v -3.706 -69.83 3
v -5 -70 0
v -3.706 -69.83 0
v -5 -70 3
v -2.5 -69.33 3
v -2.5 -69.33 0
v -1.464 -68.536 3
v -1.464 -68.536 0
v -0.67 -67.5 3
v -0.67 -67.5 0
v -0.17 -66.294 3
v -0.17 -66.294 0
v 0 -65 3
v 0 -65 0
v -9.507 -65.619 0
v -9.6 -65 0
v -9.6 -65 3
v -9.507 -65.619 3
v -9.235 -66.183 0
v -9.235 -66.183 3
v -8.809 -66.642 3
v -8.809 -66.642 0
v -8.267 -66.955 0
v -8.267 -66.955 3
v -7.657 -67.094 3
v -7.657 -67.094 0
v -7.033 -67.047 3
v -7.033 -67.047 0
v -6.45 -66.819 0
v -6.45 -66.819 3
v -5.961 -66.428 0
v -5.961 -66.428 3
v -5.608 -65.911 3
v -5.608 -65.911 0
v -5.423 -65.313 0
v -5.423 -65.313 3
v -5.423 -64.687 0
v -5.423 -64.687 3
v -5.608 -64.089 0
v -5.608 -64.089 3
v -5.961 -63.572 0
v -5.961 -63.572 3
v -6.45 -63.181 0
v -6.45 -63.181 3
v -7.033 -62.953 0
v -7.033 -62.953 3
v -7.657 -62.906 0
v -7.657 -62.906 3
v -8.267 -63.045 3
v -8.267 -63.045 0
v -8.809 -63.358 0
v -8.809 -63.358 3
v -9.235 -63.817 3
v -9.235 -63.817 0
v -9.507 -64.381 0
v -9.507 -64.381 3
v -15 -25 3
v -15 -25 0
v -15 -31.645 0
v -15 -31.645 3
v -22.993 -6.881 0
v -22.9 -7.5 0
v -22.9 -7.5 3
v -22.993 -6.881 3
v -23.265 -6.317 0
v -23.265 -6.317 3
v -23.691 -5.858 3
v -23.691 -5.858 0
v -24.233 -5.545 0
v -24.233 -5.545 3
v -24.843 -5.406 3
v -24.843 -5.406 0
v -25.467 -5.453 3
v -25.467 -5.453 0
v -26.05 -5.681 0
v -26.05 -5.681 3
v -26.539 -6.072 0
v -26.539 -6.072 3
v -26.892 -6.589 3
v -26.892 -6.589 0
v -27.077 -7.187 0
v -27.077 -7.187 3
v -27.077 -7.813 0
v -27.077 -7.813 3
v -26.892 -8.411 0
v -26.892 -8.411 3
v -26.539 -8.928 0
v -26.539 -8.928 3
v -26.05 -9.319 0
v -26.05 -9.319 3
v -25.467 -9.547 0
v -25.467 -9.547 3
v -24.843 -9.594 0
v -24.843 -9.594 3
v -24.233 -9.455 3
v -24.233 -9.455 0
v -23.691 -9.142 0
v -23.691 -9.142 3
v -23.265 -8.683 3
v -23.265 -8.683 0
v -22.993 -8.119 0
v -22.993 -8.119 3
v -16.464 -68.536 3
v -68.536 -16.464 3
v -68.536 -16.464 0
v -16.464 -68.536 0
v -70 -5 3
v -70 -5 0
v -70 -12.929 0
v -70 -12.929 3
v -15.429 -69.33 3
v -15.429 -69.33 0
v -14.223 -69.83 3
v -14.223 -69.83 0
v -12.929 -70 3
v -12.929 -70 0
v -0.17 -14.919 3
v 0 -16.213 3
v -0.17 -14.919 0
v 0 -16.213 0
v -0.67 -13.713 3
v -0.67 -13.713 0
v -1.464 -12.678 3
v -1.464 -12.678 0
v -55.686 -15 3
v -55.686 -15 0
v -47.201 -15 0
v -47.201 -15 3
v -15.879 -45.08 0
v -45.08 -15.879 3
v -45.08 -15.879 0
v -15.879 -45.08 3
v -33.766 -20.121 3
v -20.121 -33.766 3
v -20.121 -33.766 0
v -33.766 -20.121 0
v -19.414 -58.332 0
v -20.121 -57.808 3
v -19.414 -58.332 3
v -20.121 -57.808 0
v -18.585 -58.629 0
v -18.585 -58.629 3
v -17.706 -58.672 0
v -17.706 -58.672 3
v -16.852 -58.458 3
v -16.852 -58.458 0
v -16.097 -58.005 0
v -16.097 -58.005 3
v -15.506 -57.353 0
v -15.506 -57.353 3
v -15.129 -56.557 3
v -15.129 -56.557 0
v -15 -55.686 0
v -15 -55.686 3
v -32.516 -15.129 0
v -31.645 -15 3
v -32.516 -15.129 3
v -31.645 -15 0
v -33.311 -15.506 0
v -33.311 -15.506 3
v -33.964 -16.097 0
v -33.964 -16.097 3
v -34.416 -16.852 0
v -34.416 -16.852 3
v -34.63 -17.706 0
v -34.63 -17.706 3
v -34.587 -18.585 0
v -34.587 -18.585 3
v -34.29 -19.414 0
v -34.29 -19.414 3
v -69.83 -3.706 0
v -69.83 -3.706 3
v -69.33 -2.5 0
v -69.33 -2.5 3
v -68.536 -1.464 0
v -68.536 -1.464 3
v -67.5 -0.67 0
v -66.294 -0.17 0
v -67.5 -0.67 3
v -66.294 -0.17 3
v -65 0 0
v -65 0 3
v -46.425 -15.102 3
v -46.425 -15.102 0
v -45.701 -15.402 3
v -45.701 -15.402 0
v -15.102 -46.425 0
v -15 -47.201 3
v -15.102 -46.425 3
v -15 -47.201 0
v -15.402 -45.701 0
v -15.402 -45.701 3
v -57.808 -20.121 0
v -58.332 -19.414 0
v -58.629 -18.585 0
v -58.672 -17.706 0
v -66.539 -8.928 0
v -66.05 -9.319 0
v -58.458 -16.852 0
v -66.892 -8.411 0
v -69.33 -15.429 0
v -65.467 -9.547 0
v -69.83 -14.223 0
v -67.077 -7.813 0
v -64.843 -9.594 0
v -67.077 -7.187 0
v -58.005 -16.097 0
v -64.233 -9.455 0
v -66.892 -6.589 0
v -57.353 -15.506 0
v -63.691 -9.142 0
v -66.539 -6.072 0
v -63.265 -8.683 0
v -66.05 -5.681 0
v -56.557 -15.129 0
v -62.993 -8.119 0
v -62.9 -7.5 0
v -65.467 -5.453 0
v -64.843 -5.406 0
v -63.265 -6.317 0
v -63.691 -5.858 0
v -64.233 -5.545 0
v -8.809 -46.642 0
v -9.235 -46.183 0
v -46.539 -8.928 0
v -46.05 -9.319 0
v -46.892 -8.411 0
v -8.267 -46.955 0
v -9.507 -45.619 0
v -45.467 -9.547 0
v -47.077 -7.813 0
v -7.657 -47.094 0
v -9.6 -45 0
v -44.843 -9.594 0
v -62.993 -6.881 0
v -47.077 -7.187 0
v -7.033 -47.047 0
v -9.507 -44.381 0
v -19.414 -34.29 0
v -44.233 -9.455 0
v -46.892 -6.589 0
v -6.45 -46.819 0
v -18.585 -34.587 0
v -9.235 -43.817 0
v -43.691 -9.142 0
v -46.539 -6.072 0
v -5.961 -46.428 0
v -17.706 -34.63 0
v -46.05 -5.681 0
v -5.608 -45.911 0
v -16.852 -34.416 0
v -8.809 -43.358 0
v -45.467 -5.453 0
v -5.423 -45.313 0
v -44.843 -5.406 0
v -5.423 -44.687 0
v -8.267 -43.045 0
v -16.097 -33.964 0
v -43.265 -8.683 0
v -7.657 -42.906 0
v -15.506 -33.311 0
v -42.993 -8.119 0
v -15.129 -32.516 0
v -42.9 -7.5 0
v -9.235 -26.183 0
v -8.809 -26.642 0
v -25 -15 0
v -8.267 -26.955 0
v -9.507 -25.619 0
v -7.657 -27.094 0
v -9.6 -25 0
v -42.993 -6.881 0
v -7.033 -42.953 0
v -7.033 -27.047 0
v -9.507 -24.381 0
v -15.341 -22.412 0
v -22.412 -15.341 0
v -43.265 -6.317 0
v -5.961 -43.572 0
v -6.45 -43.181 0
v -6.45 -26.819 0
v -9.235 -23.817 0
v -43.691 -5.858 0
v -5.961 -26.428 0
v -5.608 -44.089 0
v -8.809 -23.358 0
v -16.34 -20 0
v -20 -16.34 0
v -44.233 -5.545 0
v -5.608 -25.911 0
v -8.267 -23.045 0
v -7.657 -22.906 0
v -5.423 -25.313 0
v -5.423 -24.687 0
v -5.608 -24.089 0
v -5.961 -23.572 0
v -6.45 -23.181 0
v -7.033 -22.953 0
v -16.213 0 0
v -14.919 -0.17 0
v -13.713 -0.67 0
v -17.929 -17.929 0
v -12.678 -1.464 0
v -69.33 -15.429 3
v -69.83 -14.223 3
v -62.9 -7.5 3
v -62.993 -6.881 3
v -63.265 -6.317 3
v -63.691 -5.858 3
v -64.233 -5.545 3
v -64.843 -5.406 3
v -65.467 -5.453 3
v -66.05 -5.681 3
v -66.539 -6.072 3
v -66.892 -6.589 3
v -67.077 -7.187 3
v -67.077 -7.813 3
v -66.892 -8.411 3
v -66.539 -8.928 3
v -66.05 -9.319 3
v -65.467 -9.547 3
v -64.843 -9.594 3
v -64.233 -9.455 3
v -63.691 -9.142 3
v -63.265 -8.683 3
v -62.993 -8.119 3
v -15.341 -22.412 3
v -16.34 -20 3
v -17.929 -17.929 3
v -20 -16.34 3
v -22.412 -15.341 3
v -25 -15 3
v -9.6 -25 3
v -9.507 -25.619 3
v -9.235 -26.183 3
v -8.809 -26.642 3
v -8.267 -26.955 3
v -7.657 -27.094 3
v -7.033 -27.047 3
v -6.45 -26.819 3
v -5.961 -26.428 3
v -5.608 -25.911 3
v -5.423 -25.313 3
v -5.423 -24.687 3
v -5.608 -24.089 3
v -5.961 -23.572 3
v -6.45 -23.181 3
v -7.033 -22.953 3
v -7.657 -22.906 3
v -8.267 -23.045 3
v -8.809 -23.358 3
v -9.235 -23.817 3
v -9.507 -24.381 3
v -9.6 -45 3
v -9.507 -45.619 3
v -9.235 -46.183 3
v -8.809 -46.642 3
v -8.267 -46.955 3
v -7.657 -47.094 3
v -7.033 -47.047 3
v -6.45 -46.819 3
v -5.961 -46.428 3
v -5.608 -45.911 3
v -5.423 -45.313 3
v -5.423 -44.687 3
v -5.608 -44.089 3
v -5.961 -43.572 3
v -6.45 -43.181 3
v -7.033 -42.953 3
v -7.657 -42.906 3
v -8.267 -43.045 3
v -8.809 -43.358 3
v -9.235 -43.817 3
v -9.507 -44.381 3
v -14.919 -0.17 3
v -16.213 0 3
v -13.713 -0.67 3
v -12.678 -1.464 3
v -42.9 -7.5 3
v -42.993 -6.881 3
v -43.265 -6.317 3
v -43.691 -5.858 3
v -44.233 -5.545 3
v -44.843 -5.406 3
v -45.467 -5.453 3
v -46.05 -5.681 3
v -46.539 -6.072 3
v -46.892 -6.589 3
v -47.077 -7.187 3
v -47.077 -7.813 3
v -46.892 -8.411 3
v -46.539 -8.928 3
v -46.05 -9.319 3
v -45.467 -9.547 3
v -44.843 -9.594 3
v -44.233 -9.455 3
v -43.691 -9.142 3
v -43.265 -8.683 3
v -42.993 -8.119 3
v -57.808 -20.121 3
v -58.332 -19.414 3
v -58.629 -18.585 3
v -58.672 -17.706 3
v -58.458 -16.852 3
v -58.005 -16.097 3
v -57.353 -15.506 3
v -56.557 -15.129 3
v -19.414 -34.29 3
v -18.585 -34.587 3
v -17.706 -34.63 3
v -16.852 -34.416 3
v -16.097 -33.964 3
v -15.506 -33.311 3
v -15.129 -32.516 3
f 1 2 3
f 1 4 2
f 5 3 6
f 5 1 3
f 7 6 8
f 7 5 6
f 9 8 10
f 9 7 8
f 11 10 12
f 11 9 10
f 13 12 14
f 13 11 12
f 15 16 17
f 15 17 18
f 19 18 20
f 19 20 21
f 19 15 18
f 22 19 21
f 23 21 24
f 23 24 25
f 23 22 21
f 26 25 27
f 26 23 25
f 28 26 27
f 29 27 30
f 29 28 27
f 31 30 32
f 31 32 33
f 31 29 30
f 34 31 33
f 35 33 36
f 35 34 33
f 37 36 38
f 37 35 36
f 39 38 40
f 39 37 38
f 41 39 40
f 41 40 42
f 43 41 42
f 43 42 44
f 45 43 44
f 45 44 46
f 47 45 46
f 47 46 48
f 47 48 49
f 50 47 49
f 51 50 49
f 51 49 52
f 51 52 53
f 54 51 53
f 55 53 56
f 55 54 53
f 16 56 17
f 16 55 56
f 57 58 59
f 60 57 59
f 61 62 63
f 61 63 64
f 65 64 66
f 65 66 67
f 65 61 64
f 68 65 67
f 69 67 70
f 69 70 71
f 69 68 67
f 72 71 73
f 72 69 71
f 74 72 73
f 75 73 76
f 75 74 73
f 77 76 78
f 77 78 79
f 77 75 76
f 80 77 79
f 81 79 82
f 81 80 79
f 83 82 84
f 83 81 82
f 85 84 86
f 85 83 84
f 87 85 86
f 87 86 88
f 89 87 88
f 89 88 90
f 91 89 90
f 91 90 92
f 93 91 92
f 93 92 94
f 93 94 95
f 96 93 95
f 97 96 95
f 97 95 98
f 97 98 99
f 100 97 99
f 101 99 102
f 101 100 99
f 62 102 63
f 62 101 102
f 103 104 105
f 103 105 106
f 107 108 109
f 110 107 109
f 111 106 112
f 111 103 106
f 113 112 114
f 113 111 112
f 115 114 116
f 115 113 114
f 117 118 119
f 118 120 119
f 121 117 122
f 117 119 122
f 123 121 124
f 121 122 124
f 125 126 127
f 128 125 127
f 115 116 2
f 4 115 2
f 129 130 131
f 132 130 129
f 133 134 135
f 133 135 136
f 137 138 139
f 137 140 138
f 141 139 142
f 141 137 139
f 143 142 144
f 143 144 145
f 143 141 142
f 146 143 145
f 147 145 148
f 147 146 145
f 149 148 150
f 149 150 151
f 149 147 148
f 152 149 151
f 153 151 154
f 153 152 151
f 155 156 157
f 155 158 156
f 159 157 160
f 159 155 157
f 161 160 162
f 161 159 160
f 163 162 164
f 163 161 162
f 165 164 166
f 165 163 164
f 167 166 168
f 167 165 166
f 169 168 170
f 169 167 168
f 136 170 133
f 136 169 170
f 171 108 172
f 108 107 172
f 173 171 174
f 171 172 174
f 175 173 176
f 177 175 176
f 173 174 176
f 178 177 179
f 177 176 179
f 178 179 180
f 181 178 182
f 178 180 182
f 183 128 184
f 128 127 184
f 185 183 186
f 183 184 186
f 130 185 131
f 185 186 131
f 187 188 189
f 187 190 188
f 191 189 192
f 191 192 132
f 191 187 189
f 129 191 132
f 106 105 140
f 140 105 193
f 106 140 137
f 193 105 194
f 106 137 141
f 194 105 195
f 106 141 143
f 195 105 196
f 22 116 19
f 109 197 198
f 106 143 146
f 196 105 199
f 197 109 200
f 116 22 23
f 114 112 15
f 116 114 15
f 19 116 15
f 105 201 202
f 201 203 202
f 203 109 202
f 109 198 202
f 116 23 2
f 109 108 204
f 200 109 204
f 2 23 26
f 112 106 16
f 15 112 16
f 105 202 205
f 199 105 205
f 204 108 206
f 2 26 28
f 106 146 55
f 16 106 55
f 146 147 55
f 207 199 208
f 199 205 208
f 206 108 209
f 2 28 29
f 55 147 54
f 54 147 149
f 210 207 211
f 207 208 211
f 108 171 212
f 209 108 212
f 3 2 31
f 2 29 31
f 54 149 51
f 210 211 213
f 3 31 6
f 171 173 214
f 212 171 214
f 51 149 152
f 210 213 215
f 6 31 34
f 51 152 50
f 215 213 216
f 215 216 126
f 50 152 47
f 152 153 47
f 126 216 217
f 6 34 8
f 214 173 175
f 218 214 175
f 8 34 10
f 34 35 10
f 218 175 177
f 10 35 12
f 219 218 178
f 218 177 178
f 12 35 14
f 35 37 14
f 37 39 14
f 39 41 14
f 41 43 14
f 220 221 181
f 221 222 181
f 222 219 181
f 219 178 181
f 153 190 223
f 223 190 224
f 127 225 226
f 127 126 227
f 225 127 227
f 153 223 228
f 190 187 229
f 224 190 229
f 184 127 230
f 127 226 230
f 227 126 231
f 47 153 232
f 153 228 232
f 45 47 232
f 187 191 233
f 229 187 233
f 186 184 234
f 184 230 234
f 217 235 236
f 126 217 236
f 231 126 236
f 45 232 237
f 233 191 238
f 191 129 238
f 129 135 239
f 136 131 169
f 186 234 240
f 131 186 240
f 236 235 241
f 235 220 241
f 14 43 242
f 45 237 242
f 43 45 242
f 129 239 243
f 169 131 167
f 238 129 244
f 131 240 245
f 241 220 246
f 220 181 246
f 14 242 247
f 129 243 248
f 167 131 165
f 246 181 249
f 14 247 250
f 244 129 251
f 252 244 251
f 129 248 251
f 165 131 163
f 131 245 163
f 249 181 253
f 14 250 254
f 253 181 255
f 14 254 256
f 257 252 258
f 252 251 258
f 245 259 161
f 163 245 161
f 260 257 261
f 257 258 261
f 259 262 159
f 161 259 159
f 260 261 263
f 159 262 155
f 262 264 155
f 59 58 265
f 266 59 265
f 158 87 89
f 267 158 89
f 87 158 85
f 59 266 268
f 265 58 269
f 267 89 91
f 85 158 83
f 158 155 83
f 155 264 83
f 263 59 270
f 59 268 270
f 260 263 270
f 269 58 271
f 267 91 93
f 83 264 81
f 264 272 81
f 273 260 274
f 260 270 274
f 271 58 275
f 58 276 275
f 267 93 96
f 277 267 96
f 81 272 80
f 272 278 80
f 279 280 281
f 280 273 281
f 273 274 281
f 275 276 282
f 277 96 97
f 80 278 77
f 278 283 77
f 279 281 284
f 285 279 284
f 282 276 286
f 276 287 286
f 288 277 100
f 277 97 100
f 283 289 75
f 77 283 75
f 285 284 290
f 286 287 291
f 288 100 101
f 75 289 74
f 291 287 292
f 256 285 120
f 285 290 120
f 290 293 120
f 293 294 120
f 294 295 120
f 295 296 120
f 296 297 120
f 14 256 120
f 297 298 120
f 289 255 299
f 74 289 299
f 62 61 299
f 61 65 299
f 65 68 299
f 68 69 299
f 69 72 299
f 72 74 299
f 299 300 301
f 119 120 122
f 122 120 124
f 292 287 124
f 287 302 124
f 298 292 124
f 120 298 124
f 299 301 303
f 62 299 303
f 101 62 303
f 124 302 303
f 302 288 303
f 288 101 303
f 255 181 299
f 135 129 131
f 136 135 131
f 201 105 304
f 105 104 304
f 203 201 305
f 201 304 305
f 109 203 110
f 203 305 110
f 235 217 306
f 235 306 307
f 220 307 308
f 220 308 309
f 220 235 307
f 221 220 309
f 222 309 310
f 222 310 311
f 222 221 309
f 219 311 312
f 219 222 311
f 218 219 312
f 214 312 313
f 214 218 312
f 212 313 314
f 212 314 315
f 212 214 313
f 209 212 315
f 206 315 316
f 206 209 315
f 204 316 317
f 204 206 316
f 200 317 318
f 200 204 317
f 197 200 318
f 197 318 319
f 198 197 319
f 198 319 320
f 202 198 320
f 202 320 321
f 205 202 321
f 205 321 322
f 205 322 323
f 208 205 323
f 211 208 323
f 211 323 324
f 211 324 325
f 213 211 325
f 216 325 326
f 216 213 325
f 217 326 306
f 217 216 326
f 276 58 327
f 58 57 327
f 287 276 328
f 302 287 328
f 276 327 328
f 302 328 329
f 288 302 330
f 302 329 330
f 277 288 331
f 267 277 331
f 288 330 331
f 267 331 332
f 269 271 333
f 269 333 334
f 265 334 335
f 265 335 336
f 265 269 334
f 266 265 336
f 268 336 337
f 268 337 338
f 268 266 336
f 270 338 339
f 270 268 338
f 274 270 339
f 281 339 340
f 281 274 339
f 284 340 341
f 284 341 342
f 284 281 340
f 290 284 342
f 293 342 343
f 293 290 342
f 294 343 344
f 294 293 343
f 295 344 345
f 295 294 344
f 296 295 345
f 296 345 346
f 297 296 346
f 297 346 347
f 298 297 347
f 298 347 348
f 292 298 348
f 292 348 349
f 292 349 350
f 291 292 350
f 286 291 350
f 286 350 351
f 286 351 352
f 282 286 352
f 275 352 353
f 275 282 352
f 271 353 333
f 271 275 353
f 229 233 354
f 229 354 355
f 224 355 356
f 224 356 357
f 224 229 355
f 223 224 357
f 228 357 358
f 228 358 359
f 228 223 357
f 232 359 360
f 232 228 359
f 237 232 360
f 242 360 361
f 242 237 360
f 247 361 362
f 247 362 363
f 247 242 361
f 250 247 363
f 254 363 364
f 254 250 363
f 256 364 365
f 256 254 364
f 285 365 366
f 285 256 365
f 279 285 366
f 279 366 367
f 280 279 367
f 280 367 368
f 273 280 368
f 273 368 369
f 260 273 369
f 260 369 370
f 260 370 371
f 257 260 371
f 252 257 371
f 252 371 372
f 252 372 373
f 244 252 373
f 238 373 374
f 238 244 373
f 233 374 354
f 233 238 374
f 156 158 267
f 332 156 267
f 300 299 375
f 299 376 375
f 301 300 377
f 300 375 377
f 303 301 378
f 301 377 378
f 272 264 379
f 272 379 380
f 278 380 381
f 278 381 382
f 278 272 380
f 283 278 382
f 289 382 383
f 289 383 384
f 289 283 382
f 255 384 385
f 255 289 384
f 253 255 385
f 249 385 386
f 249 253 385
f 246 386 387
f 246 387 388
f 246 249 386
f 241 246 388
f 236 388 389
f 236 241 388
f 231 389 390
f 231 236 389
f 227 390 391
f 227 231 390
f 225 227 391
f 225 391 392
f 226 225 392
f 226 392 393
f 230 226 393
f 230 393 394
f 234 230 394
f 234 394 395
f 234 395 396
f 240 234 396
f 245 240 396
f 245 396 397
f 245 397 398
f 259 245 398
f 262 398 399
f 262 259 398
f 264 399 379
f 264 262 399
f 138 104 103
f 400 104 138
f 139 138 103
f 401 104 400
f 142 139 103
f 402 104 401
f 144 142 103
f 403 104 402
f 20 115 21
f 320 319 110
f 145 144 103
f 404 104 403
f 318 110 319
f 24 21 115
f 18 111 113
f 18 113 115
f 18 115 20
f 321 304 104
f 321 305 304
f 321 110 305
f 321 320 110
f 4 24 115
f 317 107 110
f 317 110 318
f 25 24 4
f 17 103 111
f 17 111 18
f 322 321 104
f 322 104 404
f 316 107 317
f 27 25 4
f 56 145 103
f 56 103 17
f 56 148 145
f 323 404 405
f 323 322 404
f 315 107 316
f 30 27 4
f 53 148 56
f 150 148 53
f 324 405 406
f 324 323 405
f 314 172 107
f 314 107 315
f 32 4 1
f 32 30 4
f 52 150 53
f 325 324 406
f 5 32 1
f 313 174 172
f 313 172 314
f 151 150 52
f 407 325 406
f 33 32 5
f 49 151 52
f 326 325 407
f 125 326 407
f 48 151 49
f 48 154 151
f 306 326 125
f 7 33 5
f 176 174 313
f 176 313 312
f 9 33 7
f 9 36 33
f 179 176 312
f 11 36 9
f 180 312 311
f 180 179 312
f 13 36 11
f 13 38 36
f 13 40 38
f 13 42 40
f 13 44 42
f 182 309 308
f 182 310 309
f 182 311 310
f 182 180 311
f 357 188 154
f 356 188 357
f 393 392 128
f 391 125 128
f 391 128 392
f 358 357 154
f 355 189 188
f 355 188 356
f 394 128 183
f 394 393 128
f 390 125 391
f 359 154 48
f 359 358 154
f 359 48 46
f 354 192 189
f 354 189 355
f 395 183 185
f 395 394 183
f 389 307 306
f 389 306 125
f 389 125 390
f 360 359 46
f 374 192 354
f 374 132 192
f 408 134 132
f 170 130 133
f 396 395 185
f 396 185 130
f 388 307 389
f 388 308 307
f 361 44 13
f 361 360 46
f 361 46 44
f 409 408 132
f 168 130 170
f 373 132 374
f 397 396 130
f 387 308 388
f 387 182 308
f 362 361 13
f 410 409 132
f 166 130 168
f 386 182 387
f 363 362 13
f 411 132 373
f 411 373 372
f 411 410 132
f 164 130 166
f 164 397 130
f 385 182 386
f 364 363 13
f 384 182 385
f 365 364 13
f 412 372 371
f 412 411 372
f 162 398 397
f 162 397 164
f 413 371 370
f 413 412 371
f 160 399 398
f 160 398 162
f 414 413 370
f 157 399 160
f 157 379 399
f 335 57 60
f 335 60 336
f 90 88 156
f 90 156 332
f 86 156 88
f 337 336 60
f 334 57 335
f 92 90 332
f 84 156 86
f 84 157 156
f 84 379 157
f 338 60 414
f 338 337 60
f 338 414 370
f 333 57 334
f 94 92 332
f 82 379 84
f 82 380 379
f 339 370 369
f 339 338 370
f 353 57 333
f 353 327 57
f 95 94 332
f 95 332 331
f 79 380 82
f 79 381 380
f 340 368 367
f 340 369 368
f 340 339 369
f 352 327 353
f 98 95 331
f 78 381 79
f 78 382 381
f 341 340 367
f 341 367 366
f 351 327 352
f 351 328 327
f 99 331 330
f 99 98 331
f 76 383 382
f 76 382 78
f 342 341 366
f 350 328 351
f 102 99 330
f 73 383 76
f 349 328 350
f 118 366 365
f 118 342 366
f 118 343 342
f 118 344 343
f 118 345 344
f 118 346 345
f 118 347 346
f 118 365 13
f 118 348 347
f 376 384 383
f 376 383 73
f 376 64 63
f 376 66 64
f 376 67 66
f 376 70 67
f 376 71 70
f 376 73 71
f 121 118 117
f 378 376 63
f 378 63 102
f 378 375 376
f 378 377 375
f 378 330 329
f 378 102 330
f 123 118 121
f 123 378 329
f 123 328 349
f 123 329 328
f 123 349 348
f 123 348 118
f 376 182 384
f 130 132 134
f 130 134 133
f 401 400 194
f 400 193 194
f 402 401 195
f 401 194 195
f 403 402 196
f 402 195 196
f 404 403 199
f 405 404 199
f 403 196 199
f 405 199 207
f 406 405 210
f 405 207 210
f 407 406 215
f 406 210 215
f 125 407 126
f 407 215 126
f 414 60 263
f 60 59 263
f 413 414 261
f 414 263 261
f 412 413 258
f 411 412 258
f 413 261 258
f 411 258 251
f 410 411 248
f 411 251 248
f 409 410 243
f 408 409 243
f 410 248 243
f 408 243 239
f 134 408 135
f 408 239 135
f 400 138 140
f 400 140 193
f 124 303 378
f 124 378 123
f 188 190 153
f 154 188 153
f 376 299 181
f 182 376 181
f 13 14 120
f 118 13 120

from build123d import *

# Parameters (mm, degrees)
SKETCH_1_R               = 2.1
EXTRUDE_1_DEPTH          = 3
EXTRUDE_2_DEPTH          = 3
CUT_EXTRUDE_1_DEPTH      = 100.040395799
CUT_EXTRUDE_1_DEPTH_BACK = 3
FILLET_1_R               = 5
EXTRUDE_3_DEPTH          = 3
FILLET_2_R               = 3
FILLET_3_R               = 10


with BuildPart() as part:
    # 草图1 → 凸台-拉伸1 (new body)
    with BuildSketch(Plane.XY):
        Polygon((0, 0), (-70, 0), (-70, -15), (-15, -15), (-15, -70), (0, -70), align=None)
        with Locations((-25, -7.5)):
            Circle(SKETCH_1_R, mode=Mode.SUBTRACT)
        with Locations(Location((-7.5, -25, 0), (0, 0, 180))):
            Circle(SKETCH_1_R, mode=Mode.SUBTRACT)
        with Locations((-45, -7.5)):
            Circle(SKETCH_1_R, mode=Mode.SUBTRACT)
        with Locations((-65, -7.5)):
            Circle(SKETCH_1_R, mode=Mode.SUBTRACT)
        with Locations(Location((-7.5, -65, 0), (0, 0, 180))):
            Circle(SKETCH_1_R, mode=Mode.SUBTRACT)
        with Locations(Location((-7.5, -45, 0), (0, 0, 180))):
            Circle(SKETCH_1_R, mode=Mode.SUBTRACT)
    extrude(amount=EXTRUDE_1_DEPTH)

    # 草图2 → 凸台-拉伸2 (add)
    with BuildSketch(Plane.XY.offset(3)):
        Polygon((-70, -15), (-15, -70), (-15, -62.928932188), (-62.928932188, -15), align=None)
    extrude(amount=-EXTRUDE_2_DEPTH)

    # 草图3 → 切除-拉伸1 (cut, two sides: drawn at the far end of the back side and taken through both)
    with BuildSketch(Plane.XY.offset(3).offset(-CUT_EXTRUDE_1_DEPTH_BACK)):
        Polygon((-147.863122604, 133.72098698), (-14.142135624, 0), (0, -14.142135624), (133.72098698, -147.863122604), (401.162960941, 119.578851357), (119.578851357, 401.162960941), align=None)
    extrude(amount=CUT_EXTRUDE_1_DEPTH + CUT_EXTRUDE_1_DEPTH_BACK, mode=Mode.SUBTRACT)

    # 圆角1
    fillet_1_edges = [part.edges().sort_by_distance(p)[0] for p in [
        (0, -70, 1.5),
        (-15, -70, 1.5),
        (-70, -15, 1.5),
        (-70, 0, 1.5),
        (-14.142135624, 0, 1.5),
        (0, -14.142135624, 1.5),
    ]]
    fillet(fillet_1_edges, radius=FILLET_1_R)

    # 草图4 → 凸台-拉伸3 (add, through all)
    with BuildSketch(Plane.XY.offset(3)):
        Polygon((-45.95836944, -15), (-15, -45.95836944), (-15, -38.887301628), (-38.887301628, -15), align=None)
    extrude(amount=-EXTRUDE_3_DEPTH)

    # 圆角2
    fillet_2_edges = [part.edges().sort_by_distance(p)[0] for p in [
        (-45.95836944, -15, 1.5),
        (-38.887301628, -15, 1.5),
        (-15, -38.887301628, 1.5),
        (-15, -45.95836944, 1.5),
        (-62.928932188, -15, 1.5),
        (-15, -62.928932188, 1.5),
    ]]
    fillet(fillet_2_edges, radius=FILLET_2_R)

    # 圆角3
    fillet_3_edges = [part.edges().sort_by_distance(p)[0] for p in [
        (-15, -15, 1.5),
    ]]
    fillet(fillet_3_edges, radius=FILLET_3_R)


solid = part.part
